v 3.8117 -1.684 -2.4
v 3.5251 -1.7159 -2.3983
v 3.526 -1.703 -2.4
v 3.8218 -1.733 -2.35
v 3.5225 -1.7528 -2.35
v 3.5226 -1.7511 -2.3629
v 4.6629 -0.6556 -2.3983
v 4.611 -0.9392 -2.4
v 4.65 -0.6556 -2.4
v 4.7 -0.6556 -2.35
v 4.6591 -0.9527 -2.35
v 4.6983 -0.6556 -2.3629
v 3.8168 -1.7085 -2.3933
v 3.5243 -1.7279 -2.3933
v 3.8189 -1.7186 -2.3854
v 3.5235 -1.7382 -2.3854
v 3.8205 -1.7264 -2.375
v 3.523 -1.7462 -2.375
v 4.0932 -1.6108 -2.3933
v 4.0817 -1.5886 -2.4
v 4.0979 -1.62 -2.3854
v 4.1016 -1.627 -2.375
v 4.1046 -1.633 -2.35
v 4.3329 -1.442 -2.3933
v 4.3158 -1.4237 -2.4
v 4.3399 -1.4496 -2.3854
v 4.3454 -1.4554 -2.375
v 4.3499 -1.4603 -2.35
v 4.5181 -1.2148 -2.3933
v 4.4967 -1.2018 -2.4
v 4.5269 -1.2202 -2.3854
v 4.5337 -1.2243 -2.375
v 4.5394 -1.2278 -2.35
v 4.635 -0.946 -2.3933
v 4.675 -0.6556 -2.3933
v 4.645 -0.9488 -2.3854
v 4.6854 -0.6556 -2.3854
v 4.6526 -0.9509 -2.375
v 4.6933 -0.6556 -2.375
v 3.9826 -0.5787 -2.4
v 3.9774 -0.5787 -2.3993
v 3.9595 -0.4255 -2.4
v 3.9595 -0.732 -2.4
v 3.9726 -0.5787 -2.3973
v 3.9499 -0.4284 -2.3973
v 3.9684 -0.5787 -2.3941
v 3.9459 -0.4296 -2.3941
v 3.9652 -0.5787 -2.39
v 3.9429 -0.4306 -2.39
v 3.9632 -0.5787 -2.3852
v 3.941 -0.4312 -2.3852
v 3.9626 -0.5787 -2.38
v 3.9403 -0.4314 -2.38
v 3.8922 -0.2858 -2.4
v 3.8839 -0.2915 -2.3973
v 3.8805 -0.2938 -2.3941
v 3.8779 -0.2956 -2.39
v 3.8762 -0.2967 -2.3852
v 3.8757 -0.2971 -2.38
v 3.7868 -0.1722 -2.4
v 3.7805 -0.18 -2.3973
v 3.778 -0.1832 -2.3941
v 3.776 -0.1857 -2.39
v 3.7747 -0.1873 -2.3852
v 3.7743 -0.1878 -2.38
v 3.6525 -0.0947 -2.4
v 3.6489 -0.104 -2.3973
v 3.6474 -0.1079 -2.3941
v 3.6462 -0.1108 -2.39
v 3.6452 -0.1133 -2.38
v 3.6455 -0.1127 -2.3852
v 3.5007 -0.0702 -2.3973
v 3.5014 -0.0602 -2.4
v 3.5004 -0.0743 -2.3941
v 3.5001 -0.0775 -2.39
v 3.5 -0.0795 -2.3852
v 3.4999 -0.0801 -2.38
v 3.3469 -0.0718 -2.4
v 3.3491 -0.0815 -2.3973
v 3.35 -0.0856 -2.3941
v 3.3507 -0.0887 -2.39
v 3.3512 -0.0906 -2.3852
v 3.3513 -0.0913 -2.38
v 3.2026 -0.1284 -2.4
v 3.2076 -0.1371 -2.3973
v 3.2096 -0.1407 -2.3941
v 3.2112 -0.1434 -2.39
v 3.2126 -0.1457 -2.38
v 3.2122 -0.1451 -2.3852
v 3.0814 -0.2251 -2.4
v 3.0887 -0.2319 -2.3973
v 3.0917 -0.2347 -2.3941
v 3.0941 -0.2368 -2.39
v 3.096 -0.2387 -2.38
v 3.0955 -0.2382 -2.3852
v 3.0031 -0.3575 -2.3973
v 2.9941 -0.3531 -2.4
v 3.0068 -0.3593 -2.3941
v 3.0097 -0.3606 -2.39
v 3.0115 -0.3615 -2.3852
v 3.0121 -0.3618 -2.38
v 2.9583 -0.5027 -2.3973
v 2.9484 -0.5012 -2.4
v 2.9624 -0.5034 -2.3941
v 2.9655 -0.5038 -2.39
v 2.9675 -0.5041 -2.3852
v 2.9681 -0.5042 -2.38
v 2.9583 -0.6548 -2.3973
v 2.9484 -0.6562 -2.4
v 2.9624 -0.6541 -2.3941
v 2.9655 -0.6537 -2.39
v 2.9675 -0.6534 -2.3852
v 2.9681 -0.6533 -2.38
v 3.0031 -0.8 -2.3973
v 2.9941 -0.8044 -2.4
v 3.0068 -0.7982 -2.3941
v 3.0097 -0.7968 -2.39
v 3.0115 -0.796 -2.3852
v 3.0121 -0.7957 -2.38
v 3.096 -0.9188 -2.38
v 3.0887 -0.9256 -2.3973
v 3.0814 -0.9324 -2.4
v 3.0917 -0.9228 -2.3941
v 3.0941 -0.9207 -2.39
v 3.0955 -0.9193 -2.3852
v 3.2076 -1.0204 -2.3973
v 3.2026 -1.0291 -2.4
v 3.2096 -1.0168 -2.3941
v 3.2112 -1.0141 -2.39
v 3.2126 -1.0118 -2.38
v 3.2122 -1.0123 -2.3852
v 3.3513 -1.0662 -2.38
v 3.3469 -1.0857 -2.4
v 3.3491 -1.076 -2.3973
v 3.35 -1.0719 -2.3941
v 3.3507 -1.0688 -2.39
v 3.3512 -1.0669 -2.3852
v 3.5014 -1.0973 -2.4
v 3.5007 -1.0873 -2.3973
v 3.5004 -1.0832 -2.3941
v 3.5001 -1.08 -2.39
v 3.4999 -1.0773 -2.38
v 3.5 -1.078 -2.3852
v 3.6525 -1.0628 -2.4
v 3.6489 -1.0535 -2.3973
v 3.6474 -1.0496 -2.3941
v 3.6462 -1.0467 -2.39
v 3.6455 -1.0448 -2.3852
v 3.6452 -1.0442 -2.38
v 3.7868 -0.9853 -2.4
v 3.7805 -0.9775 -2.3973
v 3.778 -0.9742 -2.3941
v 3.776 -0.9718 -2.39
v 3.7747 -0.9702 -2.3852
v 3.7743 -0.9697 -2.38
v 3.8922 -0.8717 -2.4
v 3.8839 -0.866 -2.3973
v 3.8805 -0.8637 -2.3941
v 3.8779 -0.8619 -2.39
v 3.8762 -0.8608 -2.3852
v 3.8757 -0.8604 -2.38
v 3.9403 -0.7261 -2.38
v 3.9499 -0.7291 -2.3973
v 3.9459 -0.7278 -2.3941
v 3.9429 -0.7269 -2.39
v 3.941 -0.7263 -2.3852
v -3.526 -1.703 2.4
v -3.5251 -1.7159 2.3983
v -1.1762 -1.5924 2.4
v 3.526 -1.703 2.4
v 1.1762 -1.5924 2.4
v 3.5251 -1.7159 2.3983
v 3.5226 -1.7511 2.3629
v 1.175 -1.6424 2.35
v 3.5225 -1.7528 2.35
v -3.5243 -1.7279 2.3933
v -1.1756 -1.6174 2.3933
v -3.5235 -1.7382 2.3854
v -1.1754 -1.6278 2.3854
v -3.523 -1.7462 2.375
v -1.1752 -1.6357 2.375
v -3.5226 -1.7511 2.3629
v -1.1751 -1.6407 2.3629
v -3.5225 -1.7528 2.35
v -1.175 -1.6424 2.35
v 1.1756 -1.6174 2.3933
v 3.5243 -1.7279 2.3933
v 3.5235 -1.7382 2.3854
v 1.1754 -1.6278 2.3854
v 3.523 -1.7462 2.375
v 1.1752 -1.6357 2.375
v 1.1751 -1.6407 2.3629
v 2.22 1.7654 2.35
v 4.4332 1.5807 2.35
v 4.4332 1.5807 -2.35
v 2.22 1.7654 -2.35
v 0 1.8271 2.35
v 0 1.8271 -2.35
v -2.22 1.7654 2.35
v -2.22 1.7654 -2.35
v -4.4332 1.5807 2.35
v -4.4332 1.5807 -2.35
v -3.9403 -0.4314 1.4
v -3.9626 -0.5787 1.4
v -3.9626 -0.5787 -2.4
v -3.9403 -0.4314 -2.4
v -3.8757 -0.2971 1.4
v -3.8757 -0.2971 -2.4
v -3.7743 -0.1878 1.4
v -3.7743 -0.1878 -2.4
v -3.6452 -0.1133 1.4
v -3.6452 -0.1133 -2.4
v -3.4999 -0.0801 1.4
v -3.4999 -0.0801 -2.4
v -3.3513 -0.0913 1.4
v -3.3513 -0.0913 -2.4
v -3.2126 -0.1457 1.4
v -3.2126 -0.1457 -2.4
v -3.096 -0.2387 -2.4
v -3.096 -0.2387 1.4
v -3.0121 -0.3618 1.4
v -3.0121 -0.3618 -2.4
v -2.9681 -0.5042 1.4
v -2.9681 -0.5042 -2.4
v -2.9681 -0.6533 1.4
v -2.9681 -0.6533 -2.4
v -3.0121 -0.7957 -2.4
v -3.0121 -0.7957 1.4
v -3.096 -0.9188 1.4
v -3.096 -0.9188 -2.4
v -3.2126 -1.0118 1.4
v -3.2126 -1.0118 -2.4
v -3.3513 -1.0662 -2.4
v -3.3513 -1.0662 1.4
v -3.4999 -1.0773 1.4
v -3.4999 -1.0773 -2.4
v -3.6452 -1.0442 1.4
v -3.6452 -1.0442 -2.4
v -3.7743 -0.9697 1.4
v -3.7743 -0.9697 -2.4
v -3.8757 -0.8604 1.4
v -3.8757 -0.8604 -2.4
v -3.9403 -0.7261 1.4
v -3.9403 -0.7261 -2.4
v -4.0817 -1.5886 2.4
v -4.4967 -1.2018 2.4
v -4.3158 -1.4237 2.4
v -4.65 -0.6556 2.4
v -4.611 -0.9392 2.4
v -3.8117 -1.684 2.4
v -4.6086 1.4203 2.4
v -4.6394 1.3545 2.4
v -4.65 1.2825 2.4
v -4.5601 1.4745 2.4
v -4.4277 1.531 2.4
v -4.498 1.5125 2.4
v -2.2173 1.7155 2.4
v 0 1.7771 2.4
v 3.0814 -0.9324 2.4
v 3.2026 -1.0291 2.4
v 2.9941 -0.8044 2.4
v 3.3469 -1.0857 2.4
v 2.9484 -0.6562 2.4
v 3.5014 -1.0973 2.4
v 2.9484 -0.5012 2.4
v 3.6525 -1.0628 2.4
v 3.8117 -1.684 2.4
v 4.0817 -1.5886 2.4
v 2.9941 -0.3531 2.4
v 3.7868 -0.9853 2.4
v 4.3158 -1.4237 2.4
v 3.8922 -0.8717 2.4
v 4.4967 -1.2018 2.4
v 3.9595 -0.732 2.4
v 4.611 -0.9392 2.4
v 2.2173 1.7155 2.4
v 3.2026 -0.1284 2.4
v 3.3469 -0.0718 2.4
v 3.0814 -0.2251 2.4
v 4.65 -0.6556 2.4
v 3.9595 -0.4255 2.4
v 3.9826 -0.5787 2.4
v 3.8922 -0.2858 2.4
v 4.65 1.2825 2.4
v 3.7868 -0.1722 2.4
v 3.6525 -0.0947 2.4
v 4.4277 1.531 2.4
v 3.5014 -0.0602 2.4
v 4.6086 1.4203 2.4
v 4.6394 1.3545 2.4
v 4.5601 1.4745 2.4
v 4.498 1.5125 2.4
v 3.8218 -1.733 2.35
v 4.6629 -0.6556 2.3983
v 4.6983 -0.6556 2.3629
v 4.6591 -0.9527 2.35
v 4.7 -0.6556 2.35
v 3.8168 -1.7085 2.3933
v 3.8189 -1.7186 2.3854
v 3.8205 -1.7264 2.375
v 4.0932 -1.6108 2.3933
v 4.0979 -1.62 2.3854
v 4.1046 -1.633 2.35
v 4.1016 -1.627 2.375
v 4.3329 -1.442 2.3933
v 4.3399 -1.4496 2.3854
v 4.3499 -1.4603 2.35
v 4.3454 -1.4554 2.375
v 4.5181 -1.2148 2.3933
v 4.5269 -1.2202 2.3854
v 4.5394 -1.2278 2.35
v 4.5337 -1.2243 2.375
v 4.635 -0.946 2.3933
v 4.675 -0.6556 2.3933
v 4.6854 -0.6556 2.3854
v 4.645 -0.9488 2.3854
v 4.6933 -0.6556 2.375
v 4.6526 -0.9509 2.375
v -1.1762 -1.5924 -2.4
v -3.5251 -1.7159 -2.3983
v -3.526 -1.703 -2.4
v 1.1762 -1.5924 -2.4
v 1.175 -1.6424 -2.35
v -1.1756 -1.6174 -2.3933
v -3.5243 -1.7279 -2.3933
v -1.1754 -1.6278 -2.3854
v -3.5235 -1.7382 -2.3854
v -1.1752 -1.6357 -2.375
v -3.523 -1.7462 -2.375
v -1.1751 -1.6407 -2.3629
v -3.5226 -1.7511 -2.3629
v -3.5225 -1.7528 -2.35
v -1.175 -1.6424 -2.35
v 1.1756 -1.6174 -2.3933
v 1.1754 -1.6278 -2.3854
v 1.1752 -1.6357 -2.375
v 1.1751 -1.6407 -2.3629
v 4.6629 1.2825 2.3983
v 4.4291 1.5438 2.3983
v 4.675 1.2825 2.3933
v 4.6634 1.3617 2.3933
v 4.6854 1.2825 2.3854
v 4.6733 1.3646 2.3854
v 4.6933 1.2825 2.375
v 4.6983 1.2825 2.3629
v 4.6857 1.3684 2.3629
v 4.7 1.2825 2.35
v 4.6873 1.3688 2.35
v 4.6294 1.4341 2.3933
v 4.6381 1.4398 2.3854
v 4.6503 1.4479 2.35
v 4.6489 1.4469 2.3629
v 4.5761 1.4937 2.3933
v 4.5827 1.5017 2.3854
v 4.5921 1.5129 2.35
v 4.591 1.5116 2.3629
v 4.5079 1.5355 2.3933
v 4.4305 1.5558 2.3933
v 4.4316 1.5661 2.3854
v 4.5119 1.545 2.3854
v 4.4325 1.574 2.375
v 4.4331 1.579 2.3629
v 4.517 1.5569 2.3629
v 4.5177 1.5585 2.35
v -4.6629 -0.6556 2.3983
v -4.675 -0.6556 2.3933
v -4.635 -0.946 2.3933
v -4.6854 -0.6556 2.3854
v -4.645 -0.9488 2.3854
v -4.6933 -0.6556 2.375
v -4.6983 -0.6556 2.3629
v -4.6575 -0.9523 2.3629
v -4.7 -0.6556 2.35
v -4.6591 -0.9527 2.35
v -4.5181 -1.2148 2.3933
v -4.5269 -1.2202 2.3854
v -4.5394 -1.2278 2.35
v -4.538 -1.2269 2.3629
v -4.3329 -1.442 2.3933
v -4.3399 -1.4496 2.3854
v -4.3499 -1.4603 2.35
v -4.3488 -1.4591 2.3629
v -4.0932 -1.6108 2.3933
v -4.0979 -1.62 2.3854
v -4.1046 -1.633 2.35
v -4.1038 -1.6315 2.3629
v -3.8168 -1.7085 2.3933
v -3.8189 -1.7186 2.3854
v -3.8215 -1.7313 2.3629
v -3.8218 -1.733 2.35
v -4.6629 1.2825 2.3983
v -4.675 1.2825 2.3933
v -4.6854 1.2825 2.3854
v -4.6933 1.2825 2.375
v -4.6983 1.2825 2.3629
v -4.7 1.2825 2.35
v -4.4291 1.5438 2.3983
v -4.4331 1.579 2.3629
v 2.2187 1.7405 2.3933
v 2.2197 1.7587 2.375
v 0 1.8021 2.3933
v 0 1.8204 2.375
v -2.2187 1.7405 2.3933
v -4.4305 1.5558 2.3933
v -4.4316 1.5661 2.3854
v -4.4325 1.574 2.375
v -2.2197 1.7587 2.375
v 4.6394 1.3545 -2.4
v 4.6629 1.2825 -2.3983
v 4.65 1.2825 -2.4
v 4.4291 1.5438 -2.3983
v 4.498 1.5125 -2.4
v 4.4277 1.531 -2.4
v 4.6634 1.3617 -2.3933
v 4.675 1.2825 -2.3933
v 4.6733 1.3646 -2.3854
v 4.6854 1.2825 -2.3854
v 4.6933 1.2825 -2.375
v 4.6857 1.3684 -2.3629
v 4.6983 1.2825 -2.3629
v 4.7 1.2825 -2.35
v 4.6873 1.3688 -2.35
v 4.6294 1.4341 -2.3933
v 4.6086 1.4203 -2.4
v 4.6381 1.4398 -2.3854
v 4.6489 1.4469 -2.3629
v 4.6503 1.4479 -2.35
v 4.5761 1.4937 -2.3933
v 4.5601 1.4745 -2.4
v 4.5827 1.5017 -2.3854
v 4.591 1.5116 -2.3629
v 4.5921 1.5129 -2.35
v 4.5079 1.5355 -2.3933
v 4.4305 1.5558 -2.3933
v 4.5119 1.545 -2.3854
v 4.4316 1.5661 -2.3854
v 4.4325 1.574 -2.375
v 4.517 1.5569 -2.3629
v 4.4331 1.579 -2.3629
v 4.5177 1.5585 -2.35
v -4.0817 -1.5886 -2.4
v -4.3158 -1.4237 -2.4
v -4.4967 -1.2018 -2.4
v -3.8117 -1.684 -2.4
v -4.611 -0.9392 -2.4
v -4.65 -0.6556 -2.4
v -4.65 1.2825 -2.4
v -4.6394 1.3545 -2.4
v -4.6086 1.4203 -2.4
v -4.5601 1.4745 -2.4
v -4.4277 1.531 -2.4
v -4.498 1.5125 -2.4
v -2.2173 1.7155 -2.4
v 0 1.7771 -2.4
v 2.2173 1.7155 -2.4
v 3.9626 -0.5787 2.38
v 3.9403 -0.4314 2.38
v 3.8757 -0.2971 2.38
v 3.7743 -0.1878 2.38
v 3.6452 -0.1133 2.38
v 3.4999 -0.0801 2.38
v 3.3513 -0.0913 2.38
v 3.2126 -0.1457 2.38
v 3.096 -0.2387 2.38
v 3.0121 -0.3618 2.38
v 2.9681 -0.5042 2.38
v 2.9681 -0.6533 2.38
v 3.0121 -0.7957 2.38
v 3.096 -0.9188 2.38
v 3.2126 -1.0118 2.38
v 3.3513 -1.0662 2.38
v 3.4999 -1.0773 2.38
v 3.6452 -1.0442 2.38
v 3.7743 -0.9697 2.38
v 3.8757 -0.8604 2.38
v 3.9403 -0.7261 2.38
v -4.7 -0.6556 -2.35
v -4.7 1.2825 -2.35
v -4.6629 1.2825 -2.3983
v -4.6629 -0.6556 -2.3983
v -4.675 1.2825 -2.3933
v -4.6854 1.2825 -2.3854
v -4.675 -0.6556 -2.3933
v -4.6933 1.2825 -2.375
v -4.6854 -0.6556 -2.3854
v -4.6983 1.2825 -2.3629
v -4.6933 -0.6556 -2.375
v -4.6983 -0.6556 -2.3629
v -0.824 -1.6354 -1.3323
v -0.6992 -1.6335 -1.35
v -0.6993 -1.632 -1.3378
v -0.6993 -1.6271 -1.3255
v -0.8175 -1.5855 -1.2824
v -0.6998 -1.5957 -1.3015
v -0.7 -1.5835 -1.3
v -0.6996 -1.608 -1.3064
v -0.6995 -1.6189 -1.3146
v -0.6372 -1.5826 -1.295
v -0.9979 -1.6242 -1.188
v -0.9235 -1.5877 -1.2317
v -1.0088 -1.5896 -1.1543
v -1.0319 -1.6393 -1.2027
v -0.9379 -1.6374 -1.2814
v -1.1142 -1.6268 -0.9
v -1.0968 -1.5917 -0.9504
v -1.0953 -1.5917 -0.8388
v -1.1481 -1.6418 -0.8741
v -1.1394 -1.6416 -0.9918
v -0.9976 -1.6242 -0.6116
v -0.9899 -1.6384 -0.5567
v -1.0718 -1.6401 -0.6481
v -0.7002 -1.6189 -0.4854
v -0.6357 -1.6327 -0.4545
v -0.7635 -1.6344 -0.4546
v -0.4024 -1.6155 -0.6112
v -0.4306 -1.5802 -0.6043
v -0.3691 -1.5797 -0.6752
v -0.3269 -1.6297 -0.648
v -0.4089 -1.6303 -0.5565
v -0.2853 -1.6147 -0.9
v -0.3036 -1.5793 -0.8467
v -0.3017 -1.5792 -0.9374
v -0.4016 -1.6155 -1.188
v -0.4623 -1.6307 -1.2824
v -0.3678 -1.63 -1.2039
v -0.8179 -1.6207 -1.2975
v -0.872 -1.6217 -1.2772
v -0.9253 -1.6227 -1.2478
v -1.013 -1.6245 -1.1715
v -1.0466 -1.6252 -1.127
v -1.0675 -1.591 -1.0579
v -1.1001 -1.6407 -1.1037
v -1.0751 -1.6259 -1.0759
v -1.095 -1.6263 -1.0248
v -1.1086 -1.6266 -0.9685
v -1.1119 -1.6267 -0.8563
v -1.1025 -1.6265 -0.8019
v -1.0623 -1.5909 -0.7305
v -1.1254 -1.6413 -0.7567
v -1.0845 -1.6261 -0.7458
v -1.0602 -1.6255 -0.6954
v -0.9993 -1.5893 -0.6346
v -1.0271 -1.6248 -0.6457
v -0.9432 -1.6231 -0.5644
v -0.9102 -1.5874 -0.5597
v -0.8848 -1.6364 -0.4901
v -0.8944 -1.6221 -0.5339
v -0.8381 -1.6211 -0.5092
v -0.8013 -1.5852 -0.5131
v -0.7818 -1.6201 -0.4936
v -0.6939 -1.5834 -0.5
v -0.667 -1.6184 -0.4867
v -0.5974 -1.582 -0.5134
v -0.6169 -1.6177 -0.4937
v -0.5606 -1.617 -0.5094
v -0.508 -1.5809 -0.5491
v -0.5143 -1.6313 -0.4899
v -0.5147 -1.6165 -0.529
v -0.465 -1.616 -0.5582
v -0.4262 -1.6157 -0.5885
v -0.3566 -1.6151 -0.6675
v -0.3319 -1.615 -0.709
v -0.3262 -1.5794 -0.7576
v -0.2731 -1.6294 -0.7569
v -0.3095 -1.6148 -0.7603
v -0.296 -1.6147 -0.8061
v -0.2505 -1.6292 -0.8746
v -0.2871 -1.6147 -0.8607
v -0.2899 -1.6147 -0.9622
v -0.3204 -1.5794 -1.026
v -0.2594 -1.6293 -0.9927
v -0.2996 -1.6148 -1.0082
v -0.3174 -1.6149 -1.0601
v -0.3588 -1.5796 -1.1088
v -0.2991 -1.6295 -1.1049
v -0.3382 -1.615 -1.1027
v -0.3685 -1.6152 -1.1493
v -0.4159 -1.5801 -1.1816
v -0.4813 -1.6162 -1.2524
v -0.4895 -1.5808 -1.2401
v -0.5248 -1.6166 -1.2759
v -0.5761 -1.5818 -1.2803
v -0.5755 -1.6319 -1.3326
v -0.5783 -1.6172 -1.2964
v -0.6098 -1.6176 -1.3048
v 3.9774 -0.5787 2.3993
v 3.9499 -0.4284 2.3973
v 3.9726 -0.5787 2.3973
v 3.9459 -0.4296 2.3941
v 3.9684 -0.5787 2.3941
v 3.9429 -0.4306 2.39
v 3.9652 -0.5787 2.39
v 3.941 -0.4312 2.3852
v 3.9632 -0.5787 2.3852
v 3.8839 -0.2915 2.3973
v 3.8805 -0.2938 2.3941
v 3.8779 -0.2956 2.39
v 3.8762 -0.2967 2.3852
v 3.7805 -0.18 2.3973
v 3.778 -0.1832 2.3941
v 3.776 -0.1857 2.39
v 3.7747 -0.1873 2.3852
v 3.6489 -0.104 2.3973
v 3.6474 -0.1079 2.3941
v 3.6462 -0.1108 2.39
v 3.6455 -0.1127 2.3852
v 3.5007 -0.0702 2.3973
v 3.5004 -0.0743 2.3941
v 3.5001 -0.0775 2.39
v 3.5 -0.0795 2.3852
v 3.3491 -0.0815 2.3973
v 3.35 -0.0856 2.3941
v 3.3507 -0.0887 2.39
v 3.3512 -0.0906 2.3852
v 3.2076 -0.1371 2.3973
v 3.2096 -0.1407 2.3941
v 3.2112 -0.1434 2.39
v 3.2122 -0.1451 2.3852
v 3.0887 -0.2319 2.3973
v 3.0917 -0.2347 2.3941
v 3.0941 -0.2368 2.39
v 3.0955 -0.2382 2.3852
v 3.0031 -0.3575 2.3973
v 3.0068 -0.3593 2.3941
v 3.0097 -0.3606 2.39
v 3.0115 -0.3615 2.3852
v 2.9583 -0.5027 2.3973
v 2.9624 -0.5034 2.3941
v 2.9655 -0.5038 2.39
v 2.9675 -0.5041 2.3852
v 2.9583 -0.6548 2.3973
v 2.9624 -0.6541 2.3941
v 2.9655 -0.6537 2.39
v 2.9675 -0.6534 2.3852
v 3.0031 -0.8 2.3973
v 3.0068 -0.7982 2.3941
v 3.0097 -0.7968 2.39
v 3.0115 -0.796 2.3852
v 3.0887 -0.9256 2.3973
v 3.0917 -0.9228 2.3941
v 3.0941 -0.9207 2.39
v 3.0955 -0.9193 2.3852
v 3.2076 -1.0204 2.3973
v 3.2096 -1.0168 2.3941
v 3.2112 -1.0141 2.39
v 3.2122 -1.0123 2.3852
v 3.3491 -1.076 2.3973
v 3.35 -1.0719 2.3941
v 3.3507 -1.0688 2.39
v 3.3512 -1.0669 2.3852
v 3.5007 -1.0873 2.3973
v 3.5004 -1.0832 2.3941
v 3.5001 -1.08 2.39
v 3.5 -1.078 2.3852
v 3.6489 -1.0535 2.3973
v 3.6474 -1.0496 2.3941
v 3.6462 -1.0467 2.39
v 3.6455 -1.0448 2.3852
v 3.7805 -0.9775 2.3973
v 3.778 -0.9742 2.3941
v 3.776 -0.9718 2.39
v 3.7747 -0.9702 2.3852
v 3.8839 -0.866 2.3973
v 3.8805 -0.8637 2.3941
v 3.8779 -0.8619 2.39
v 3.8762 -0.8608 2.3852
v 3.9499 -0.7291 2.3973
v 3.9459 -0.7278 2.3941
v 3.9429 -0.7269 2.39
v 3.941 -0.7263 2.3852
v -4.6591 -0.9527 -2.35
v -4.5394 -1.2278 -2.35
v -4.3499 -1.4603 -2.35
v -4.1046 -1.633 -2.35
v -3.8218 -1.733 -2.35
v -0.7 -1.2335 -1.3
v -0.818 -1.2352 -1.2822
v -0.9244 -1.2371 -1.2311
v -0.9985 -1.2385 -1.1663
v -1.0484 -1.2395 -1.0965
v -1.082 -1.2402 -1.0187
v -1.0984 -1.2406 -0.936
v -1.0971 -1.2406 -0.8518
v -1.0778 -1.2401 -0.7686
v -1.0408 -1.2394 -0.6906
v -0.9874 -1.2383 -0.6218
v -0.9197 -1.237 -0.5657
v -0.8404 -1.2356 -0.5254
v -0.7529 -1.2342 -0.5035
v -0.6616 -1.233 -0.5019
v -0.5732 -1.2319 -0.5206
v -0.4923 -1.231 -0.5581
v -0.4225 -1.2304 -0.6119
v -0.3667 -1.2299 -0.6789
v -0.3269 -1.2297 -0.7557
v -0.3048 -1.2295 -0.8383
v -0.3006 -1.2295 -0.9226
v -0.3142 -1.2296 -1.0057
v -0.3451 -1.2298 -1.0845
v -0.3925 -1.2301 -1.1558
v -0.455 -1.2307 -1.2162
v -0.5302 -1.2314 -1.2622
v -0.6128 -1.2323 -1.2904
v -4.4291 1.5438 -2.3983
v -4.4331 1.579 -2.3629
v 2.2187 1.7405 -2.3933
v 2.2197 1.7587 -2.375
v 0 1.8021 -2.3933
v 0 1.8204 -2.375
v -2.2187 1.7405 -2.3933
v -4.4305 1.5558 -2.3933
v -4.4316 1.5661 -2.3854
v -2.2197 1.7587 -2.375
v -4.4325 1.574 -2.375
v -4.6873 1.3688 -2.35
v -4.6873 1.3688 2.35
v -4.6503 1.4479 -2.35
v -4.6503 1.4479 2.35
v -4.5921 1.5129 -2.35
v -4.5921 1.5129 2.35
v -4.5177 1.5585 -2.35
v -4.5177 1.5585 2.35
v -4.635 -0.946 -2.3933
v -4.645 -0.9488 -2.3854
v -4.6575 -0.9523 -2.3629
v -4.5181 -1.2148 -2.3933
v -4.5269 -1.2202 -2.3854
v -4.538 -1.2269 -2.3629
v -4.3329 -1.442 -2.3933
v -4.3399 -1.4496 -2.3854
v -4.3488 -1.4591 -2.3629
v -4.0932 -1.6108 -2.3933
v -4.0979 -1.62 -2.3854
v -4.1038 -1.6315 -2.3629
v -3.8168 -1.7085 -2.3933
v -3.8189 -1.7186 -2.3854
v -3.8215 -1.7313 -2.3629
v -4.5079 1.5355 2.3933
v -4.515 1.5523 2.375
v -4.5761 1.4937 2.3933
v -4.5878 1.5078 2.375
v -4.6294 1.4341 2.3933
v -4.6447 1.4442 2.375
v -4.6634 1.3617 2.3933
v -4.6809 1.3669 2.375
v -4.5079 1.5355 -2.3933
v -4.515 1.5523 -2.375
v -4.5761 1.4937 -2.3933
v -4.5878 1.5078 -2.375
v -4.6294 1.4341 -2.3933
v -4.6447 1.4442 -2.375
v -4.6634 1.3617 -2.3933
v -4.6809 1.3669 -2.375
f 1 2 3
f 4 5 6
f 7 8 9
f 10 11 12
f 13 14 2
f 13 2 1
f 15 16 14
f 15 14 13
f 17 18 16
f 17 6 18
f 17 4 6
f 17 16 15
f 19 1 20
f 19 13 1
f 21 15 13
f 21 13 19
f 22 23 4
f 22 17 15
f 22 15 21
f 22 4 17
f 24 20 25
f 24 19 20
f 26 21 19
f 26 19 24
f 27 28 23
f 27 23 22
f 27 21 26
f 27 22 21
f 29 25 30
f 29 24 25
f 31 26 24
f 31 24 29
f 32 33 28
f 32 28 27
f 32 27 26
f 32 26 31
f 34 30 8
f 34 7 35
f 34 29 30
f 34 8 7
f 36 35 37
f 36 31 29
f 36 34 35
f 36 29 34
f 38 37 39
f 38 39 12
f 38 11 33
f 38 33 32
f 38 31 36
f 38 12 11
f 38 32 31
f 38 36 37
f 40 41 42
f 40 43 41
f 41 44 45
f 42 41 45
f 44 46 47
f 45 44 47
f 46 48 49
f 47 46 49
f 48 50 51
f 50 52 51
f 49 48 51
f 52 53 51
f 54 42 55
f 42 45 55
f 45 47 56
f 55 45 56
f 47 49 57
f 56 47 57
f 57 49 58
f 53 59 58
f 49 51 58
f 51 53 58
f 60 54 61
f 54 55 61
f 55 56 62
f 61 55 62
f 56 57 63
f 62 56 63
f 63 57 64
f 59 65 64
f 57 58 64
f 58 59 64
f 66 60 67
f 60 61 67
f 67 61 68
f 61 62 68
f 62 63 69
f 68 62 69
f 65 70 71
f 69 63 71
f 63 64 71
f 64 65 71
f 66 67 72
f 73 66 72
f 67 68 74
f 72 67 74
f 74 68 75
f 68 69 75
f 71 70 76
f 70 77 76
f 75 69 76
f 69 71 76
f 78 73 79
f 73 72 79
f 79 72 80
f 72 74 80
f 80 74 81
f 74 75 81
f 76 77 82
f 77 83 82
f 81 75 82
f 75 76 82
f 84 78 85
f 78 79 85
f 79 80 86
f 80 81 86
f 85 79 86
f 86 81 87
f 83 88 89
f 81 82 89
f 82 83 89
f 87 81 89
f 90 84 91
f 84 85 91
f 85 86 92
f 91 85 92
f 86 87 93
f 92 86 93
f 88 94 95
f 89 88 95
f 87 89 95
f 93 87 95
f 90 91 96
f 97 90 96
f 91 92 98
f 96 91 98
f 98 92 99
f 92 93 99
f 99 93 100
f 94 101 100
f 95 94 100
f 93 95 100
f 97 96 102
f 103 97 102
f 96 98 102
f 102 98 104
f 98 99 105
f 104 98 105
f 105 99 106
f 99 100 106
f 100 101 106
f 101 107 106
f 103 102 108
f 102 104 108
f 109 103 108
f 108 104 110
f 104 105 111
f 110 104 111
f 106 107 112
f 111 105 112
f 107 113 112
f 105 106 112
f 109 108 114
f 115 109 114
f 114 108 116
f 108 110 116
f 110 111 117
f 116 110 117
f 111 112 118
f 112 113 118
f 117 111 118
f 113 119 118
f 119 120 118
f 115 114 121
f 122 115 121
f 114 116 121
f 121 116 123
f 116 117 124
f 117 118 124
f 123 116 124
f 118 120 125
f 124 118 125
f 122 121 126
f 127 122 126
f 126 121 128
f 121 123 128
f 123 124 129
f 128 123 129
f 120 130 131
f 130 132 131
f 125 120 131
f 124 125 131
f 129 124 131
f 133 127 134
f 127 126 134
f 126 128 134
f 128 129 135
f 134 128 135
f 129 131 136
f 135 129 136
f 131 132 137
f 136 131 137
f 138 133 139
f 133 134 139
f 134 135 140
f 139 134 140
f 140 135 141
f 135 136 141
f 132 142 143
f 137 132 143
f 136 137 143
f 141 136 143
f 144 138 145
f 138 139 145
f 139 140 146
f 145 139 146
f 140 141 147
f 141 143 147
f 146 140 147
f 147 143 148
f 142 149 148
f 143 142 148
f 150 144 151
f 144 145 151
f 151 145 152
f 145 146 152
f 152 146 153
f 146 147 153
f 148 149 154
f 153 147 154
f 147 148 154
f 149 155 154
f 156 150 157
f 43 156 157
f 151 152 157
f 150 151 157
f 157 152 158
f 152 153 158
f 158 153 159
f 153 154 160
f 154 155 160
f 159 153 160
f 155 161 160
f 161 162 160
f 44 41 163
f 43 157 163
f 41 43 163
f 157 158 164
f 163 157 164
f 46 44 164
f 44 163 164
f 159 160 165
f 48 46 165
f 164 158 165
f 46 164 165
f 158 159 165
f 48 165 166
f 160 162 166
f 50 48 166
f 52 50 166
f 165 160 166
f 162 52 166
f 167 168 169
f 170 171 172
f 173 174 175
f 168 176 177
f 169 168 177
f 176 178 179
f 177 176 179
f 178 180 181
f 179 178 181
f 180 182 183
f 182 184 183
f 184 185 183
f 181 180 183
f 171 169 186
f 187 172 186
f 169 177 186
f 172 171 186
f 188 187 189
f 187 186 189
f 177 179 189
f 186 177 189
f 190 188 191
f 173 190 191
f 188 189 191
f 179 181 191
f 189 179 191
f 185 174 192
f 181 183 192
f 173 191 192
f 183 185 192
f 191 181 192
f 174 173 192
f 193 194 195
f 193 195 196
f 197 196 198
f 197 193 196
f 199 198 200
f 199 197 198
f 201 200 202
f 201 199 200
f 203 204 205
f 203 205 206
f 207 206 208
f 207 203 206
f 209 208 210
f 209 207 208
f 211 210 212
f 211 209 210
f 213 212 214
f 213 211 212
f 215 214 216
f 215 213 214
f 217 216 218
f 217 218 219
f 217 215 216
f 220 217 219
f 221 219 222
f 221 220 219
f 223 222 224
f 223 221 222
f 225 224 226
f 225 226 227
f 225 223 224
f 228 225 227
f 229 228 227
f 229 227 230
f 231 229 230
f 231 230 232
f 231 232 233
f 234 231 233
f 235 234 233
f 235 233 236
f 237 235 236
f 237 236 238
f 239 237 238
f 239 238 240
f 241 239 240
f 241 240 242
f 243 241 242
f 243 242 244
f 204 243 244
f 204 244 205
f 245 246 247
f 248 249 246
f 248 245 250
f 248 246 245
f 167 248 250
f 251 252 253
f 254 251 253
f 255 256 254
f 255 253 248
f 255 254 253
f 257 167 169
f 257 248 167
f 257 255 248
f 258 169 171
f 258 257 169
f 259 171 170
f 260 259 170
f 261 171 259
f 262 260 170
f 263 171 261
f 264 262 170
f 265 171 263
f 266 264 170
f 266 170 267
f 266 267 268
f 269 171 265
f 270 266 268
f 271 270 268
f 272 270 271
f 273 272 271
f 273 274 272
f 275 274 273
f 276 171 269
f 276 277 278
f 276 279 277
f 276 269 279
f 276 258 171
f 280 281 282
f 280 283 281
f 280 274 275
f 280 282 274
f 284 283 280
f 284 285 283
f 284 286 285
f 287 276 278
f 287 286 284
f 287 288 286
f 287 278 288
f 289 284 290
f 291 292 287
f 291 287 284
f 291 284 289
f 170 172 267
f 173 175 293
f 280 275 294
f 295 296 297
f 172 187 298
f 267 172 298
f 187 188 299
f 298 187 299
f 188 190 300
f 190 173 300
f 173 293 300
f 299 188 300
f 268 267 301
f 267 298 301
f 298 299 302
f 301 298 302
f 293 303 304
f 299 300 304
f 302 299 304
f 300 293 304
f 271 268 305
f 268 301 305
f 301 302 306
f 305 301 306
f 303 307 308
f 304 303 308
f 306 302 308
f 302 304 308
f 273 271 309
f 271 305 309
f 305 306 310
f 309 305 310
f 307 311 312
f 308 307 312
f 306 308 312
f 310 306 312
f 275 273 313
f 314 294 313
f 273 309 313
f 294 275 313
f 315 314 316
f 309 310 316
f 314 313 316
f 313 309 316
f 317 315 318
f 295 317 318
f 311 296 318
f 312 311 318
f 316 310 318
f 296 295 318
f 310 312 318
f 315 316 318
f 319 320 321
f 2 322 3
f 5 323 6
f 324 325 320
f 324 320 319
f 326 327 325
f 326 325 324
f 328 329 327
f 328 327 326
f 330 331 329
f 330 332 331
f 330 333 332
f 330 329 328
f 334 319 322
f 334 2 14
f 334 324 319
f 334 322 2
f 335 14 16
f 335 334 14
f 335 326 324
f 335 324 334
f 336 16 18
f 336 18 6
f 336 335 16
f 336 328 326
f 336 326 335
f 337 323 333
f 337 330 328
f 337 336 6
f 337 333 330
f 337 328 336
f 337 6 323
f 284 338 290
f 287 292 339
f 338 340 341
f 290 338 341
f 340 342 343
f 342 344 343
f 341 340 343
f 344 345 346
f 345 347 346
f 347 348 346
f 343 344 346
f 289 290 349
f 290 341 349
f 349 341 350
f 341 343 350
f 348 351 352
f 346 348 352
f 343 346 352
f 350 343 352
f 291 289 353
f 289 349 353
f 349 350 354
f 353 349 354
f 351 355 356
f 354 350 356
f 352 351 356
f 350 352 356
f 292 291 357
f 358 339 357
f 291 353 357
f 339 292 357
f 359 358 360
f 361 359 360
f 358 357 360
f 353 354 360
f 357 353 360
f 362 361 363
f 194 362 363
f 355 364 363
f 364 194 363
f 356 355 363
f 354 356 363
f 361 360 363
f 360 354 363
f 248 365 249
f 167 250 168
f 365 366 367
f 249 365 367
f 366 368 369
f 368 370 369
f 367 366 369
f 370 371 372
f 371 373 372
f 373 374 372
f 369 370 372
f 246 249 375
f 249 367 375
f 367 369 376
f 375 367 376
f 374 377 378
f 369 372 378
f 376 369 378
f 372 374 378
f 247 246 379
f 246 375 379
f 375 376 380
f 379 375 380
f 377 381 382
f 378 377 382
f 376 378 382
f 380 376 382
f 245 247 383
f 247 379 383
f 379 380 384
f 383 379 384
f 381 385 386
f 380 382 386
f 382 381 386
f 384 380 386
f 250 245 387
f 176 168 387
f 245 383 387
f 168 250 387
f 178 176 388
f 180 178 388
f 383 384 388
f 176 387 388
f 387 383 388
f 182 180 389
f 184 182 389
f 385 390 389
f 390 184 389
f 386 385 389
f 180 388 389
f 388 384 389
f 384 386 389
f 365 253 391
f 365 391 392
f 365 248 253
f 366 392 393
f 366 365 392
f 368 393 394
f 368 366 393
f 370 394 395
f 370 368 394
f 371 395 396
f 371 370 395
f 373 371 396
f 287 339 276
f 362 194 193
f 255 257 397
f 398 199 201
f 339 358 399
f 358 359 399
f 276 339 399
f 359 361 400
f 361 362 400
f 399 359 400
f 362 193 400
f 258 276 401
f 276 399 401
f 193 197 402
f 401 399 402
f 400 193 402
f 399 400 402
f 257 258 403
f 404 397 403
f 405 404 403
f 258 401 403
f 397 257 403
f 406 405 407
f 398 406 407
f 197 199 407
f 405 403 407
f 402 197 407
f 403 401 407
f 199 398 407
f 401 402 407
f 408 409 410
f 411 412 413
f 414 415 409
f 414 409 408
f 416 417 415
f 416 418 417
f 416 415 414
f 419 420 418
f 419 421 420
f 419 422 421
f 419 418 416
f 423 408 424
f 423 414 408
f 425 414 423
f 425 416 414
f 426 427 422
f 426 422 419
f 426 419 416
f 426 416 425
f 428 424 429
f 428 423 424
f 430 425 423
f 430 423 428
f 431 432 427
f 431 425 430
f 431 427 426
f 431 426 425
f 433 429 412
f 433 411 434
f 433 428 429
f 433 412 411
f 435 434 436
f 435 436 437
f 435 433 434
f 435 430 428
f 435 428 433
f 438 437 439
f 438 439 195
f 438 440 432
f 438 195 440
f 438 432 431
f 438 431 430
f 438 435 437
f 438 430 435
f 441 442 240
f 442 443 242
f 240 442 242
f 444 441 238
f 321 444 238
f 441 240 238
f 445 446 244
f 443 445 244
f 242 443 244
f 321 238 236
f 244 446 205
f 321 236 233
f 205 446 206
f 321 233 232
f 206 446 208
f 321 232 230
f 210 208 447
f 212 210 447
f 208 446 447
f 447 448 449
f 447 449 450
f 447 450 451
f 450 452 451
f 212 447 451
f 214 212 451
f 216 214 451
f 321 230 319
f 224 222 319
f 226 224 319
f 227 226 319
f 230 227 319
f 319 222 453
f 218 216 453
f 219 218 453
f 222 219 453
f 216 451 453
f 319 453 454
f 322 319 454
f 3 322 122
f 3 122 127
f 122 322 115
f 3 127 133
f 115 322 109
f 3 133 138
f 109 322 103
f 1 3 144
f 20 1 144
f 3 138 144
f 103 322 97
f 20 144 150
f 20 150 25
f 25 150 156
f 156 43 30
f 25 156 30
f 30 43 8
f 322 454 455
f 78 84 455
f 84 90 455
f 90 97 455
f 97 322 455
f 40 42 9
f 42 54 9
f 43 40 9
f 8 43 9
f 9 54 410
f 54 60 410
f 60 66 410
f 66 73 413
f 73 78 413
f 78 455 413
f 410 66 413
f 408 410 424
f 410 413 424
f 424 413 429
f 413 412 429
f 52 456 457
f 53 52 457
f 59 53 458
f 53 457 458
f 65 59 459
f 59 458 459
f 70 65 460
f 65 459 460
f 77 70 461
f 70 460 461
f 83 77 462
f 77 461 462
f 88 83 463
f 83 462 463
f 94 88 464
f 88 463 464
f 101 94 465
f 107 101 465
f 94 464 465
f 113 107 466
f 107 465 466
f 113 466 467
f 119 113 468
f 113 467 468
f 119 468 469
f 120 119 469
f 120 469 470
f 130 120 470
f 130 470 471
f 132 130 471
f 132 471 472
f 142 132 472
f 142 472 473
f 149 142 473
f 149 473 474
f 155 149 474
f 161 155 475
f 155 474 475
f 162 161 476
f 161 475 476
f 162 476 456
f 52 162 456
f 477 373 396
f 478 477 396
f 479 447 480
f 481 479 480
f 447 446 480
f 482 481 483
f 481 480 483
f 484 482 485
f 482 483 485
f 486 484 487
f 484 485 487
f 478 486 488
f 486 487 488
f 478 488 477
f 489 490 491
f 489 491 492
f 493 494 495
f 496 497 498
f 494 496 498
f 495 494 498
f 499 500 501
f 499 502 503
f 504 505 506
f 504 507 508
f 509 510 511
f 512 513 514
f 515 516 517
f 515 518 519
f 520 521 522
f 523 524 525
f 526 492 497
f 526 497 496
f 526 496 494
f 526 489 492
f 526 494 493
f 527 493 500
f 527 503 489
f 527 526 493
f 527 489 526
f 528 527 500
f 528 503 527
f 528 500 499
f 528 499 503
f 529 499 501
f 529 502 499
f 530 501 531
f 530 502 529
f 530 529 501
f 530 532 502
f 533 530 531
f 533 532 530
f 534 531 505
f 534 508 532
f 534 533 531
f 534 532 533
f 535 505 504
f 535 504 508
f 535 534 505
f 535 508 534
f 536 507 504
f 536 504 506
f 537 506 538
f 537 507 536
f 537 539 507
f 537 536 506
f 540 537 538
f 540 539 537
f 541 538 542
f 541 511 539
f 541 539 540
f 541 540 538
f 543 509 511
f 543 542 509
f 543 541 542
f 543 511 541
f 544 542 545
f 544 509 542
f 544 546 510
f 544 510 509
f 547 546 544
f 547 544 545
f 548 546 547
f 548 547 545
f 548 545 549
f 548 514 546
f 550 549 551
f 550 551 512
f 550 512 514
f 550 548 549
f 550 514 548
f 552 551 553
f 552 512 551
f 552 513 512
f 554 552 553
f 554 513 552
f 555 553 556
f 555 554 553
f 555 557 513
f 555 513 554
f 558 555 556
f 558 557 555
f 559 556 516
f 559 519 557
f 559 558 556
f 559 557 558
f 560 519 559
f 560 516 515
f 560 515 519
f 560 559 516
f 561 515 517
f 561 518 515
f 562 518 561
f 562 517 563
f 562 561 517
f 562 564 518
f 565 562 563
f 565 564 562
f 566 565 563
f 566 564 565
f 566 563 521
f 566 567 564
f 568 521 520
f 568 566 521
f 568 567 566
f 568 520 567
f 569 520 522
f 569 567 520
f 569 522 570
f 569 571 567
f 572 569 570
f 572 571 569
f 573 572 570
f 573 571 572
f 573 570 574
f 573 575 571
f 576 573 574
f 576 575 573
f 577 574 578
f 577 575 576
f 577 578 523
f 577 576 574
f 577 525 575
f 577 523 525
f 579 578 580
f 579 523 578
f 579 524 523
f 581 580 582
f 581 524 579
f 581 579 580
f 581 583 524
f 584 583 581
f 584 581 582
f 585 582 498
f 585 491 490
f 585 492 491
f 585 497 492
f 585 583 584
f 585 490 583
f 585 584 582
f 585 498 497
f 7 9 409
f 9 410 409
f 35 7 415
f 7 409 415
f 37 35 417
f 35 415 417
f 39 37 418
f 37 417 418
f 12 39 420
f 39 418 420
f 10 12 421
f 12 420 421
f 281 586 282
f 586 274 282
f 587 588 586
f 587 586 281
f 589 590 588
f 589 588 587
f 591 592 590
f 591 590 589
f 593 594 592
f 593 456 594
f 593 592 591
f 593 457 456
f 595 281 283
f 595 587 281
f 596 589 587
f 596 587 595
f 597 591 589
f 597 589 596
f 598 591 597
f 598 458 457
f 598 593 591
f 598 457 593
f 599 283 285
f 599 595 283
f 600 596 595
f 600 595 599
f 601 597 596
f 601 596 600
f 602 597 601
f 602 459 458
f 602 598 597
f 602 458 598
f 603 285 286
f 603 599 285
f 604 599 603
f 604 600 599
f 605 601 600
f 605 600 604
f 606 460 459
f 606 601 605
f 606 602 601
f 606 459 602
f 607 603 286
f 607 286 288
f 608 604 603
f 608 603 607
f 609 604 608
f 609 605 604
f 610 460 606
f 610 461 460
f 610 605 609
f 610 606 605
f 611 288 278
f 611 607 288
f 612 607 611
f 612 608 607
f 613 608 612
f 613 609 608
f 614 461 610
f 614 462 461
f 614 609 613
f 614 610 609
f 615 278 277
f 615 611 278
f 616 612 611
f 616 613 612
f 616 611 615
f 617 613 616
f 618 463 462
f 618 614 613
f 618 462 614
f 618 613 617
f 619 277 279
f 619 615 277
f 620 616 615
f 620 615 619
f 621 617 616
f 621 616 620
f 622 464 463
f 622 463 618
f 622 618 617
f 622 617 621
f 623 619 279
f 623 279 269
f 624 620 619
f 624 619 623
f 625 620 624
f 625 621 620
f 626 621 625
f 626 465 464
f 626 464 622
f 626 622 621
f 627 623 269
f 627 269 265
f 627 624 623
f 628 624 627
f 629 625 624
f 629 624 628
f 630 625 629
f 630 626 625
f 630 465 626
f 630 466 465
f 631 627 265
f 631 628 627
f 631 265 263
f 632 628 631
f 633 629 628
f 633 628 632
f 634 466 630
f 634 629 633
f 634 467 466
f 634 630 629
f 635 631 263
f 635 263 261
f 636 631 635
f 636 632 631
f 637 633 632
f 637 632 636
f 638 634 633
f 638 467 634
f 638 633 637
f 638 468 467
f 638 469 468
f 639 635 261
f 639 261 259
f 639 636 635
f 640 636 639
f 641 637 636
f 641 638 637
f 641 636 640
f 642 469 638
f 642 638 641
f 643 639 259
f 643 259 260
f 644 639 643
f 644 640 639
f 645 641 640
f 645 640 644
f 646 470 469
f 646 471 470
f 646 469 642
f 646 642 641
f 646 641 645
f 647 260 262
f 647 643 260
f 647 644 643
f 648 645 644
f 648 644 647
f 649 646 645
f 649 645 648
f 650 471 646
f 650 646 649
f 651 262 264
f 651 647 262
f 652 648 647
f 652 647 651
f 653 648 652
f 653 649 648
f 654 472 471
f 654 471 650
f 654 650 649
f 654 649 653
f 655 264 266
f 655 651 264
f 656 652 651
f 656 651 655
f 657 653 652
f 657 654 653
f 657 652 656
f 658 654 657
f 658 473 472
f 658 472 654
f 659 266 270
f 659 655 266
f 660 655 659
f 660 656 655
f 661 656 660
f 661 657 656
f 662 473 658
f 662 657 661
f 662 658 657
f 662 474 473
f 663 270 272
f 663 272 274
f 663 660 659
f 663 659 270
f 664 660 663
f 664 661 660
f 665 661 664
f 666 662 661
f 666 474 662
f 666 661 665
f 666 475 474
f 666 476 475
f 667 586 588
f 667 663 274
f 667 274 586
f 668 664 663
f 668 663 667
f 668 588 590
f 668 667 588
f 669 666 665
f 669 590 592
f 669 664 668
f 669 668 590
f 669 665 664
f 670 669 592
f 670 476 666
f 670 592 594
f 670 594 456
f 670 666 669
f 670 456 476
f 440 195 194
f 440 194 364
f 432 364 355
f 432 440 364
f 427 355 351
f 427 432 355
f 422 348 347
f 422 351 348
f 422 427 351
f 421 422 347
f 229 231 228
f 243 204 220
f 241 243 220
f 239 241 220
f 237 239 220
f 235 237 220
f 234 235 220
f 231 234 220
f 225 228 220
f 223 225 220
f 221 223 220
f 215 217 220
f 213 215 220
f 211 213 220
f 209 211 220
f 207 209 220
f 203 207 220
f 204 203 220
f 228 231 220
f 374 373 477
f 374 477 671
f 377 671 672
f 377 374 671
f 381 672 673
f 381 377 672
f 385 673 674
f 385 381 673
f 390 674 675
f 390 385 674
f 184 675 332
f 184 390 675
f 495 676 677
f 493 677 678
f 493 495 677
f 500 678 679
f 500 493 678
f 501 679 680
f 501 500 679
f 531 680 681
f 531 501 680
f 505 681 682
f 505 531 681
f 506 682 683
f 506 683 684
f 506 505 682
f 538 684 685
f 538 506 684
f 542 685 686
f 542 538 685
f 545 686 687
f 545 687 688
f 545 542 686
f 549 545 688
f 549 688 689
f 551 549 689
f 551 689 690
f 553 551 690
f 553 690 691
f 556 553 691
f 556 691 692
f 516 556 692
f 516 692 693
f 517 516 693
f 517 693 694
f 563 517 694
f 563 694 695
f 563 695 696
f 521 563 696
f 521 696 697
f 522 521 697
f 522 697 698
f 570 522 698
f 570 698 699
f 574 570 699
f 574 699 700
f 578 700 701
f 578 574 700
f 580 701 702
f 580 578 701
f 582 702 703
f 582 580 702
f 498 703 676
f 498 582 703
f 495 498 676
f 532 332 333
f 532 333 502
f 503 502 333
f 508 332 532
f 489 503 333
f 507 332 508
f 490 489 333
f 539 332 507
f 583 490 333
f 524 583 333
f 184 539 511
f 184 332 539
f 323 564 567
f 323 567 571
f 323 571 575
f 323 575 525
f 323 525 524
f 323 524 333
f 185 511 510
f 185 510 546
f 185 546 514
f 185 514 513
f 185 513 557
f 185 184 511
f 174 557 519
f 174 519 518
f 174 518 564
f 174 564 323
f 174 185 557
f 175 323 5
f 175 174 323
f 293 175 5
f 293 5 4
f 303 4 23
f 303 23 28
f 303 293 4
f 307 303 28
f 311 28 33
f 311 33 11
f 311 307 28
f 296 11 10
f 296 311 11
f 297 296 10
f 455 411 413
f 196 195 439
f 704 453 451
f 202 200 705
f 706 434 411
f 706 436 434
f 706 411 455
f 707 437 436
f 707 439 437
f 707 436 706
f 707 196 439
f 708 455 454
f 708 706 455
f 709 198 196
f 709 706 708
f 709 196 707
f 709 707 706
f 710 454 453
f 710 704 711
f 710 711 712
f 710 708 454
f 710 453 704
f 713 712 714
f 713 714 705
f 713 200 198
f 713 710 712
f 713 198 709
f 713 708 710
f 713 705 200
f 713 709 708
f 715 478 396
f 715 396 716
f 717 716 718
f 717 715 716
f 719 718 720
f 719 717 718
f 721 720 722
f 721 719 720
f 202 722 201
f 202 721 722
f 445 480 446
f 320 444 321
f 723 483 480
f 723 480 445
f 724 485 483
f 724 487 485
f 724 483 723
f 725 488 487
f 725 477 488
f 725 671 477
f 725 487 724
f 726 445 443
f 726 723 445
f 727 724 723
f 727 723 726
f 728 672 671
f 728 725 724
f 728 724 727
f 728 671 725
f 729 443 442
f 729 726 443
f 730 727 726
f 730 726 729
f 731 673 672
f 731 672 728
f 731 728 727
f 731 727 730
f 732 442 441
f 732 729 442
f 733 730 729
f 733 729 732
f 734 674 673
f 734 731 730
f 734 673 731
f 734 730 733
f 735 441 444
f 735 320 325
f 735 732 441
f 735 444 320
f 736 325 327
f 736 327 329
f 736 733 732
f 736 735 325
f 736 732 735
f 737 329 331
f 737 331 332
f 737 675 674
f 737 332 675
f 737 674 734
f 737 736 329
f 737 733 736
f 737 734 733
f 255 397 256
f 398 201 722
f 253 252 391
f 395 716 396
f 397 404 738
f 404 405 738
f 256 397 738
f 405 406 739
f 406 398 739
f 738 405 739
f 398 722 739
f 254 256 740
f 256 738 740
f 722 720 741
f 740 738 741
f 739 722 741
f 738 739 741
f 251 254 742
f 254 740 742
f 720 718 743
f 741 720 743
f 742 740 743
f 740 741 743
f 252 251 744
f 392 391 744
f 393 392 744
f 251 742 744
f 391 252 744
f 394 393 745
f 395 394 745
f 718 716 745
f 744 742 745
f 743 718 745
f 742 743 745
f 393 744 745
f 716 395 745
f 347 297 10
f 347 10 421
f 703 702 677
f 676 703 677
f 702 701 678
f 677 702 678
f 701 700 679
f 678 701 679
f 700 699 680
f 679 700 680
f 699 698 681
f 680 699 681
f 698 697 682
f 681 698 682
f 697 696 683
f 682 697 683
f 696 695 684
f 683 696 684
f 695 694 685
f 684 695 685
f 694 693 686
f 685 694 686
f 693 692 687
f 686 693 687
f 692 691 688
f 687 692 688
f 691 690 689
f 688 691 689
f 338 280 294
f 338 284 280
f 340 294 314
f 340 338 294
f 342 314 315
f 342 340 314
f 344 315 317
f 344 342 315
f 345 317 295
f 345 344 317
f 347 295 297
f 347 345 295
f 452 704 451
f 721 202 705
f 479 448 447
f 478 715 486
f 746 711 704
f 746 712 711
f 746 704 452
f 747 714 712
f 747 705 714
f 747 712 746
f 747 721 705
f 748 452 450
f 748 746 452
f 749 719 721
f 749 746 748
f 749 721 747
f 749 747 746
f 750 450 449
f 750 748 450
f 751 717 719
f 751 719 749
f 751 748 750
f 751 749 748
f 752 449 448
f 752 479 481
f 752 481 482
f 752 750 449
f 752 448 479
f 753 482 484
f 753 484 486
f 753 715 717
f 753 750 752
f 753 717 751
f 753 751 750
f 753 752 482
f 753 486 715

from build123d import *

# Parameters (mm, degrees)
SKETCH1_W               = 9.4
SKETCH1_H               = 3.7
BOSS_EXTRUDE1_DEPTH     = 2.4
CUT_EXTRUDE1_DEPTH      = 4.8
FILLET1_R               = 1.1
FILLET2_R               = 0.3
FILLET3_R               = 0.05
SKETCH3_R               = 0.5
CUT_EXTRUDE2_DEPTH      = 4.8
FILLET4_R               = 0.02
SKETCH4_W               = 1.881576533
SKETCH4_H               = 1.177564348
BOSS_EXTRUDE2_DEPTH     = 1
SKETCH5_R               = 0.5
CUT_EXTRUDE3_DEPTH      = 10
SKETCH6_R               = 0.867809029
BOSS_EXTRUDE3_DEPTH     = 1
CUT_EXTRUDE4_REACH      = 17.585
CUT_EXTRUDE4_END_RADIUS = 50.4
CUT_EXTRUDE4_START      = -10
SKETCH7_R               = 0.4
FILLET5_R               = 0.05


with BuildPart() as part:
    # Sketch1 → Boss-Extrude1 (new, symmetric)
    with BuildSketch(Plane.XY):
        Rectangle(SKETCH1_W, SKETCH1_H)
    extrude(amount=BOSS_EXTRUDE1_DEPTH, both=True)

    # Sketch2 → Cut-Extrude1 (cut)
    with BuildSketch(Plane.XY.offset(2.4)):
        with BuildLine():
            Line((-4.7, 1.55), (-7.120690005, 4.011417256))
            Line((-7.120690005, 4.011417256), (5.535860742, 3.886722174))
            Line((5.535860742, 3.886722174), (4.7, 1.55))
            ThreePointArc((4.7, 1.55), (0, 1.827084699), (-4.7, 1.55))
        make_face()
        with BuildLine():
            Line((4.7, -1.85), (0.350623614, -3.782025322))
            Line((0.350623614, -3.782025322), (-4.7, -1.85))
            ThreePointArc((-4.7, -1.85), (0, -1.628609864), (4.7, -1.85))
        make_face()
    extrude(amount=-CUT_EXTRUDE1_DEPTH, mode=Mode.SUBTRACT)

    # Fillet1
    fillet1_edges = [part.edges().sort_by_distance(p)[0] for p in [
        (4.7, -1.85, 0),
        (-4.7, -1.85, 0),
    ]]
    fillet(fillet1_edges, radius=FILLET1_R)

    # Fillet2
    fillet2_edges = [part.edges().sort_by_distance(p)[0] for p in [
        (4.7, 1.55, 0),
        (-4.7, 1.55, 0),
    ]]
    fillet(fillet2_edges, radius=FILLET2_R)

    # Fillet3
    fillet3_edges = [part.edges().sort_by_distance(p)[0] for p in [
        (4.7, 0.3134624, -2.4),
        (4.7, 0.3134624, 2.4),
        (0, -1.628609864, -2.4),
        (-4.349918456, -1.460327621, -2.4),
        (4.349918456, -1.460327621, -2.4),
        (0, -1.628609864, 2.4),
        (-4.349918456, -1.460327621, 2.4),
        (4.349918456, -1.460327621, 2.4),
        (0, 1.827084699, 2.4),
        (-4.7, 0.3134624, 2.4),
        (-4.623578634, 1.482534062, 2.4),
        (4.623578634, 1.482534062, 2.4),
        (0, 1.827084699, -2.4),
        (-4.7, 0.3134624, -2.4),
        (-4.623578634, 1.482534062, -2.4),
        (4.623578634, 1.482534062, -2.4),
    ]]
    fillet(fillet3_edges, radius=FILLET3_R)

    # Sketch3 → Cut-Extrude2 (cut)
    with BuildSketch(Plane.XY.offset(2.4)):
        with Locations((3.462563269, -0.578744651)):
            Circle(SKETCH3_R)
    cut_extrude2 = extrude(amount=-CUT_EXTRUDE2_DEPTH, mode=Mode.SUBTRACT)

    # Fillet4
    fillet4_edges = [part.edges().sort_by_distance(p)[0] for p in [
        (2.962563269, -0.578744651, -2.4),
        (2.962563269, -0.578744651, 2.4),
    ]]
    fillet(fillet4_edges, radius=FILLET4_R)

    # Mirror1: Cut-Extrude2 across plane
    add(cut_extrude2.mirror(Plane(origin=(0, 0, 0), x_dir=(0, 0, 1), z_dir=(1, 0, 0))), mode=Mode.SUBTRACT)

    # Sketch4 → Boss-Extrude2 (add)
    with BuildSketch(Plane.XY.offset(2.4)):
        with Locations((-3.353123346, -0.588782174)):
            Rectangle(SKETCH4_W, SKETCH4_H)
    extrude(amount=-BOSS_EXTRUDE2_DEPTH)

    # Sketch5 → Cut-Extrude3 (cut)
    with BuildSketch(Plane(origin=(0, 0, 1.4), x_dir=(-1, 0, 0), z_dir=(0, 0, -1))):
        with Locations(Location((3.462563269, -0.578744651, 0), (0, 0, 180))):
            Circle(SKETCH5_R)
    extrude(amount=-CUT_EXTRUDE3_DEPTH, mode=Mode.SUBTRACT)

    # Sketch6 → Boss-Extrude3 (add)
    with BuildSketch(Plane.XY.offset(2.4)):
        with Locations((-3.432599982, -0.500417585)):
            Circle(SKETCH6_R)
    extrude(amount=-BOSS_EXTRUDE3_DEPTH)

    # Cut-Extrude4: up to this cylinder (the profile starts inside it)
    cut_extrude4_end = Plane(origin=(0, -51.628609864, -0.9), z_dir=(0, 0, 1)) * Cylinder(CUT_EXTRUDE4_END_RADIUS, 136.97, mode=Mode.PRIVATE)
    # Sketch7 → Cut-Extrude4 (cut, up to the surface)
    with BuildSketch(Plane(origin=(0, 0, 0), x_dir=(1, 0, 0), z_dir=(0, 1, 0)).offset(CUT_EXTRUDE4_START), mode=Mode.PRIVATE) as cut_extrude4_sk1:
        with Locations(Location((-0.7, 0.9, 0), (0, 0, 90))):
            Circle(SKETCH7_R)
    cut_extrude4_tool1 = extrude(cut_extrude4_sk1.sketch, amount=CUT_EXTRUDE4_REACH, mode=Mode.PRIVATE) & cut_extrude4_end
    add(cut_extrude4_tool1.solids().sort_by_distance((-0.7, -10, -0.9))[0], mode=Mode.SUBTRACT)

    # Fillet5
    fillet5_edges = [part.edges().sort_by_distance(p)[0] for p in [
        (-0.700029875, -1.633510522, -0.500000001),
    ]]
    fillet(fillet5_edges, radius=FILLET5_R)


solid = part.part
